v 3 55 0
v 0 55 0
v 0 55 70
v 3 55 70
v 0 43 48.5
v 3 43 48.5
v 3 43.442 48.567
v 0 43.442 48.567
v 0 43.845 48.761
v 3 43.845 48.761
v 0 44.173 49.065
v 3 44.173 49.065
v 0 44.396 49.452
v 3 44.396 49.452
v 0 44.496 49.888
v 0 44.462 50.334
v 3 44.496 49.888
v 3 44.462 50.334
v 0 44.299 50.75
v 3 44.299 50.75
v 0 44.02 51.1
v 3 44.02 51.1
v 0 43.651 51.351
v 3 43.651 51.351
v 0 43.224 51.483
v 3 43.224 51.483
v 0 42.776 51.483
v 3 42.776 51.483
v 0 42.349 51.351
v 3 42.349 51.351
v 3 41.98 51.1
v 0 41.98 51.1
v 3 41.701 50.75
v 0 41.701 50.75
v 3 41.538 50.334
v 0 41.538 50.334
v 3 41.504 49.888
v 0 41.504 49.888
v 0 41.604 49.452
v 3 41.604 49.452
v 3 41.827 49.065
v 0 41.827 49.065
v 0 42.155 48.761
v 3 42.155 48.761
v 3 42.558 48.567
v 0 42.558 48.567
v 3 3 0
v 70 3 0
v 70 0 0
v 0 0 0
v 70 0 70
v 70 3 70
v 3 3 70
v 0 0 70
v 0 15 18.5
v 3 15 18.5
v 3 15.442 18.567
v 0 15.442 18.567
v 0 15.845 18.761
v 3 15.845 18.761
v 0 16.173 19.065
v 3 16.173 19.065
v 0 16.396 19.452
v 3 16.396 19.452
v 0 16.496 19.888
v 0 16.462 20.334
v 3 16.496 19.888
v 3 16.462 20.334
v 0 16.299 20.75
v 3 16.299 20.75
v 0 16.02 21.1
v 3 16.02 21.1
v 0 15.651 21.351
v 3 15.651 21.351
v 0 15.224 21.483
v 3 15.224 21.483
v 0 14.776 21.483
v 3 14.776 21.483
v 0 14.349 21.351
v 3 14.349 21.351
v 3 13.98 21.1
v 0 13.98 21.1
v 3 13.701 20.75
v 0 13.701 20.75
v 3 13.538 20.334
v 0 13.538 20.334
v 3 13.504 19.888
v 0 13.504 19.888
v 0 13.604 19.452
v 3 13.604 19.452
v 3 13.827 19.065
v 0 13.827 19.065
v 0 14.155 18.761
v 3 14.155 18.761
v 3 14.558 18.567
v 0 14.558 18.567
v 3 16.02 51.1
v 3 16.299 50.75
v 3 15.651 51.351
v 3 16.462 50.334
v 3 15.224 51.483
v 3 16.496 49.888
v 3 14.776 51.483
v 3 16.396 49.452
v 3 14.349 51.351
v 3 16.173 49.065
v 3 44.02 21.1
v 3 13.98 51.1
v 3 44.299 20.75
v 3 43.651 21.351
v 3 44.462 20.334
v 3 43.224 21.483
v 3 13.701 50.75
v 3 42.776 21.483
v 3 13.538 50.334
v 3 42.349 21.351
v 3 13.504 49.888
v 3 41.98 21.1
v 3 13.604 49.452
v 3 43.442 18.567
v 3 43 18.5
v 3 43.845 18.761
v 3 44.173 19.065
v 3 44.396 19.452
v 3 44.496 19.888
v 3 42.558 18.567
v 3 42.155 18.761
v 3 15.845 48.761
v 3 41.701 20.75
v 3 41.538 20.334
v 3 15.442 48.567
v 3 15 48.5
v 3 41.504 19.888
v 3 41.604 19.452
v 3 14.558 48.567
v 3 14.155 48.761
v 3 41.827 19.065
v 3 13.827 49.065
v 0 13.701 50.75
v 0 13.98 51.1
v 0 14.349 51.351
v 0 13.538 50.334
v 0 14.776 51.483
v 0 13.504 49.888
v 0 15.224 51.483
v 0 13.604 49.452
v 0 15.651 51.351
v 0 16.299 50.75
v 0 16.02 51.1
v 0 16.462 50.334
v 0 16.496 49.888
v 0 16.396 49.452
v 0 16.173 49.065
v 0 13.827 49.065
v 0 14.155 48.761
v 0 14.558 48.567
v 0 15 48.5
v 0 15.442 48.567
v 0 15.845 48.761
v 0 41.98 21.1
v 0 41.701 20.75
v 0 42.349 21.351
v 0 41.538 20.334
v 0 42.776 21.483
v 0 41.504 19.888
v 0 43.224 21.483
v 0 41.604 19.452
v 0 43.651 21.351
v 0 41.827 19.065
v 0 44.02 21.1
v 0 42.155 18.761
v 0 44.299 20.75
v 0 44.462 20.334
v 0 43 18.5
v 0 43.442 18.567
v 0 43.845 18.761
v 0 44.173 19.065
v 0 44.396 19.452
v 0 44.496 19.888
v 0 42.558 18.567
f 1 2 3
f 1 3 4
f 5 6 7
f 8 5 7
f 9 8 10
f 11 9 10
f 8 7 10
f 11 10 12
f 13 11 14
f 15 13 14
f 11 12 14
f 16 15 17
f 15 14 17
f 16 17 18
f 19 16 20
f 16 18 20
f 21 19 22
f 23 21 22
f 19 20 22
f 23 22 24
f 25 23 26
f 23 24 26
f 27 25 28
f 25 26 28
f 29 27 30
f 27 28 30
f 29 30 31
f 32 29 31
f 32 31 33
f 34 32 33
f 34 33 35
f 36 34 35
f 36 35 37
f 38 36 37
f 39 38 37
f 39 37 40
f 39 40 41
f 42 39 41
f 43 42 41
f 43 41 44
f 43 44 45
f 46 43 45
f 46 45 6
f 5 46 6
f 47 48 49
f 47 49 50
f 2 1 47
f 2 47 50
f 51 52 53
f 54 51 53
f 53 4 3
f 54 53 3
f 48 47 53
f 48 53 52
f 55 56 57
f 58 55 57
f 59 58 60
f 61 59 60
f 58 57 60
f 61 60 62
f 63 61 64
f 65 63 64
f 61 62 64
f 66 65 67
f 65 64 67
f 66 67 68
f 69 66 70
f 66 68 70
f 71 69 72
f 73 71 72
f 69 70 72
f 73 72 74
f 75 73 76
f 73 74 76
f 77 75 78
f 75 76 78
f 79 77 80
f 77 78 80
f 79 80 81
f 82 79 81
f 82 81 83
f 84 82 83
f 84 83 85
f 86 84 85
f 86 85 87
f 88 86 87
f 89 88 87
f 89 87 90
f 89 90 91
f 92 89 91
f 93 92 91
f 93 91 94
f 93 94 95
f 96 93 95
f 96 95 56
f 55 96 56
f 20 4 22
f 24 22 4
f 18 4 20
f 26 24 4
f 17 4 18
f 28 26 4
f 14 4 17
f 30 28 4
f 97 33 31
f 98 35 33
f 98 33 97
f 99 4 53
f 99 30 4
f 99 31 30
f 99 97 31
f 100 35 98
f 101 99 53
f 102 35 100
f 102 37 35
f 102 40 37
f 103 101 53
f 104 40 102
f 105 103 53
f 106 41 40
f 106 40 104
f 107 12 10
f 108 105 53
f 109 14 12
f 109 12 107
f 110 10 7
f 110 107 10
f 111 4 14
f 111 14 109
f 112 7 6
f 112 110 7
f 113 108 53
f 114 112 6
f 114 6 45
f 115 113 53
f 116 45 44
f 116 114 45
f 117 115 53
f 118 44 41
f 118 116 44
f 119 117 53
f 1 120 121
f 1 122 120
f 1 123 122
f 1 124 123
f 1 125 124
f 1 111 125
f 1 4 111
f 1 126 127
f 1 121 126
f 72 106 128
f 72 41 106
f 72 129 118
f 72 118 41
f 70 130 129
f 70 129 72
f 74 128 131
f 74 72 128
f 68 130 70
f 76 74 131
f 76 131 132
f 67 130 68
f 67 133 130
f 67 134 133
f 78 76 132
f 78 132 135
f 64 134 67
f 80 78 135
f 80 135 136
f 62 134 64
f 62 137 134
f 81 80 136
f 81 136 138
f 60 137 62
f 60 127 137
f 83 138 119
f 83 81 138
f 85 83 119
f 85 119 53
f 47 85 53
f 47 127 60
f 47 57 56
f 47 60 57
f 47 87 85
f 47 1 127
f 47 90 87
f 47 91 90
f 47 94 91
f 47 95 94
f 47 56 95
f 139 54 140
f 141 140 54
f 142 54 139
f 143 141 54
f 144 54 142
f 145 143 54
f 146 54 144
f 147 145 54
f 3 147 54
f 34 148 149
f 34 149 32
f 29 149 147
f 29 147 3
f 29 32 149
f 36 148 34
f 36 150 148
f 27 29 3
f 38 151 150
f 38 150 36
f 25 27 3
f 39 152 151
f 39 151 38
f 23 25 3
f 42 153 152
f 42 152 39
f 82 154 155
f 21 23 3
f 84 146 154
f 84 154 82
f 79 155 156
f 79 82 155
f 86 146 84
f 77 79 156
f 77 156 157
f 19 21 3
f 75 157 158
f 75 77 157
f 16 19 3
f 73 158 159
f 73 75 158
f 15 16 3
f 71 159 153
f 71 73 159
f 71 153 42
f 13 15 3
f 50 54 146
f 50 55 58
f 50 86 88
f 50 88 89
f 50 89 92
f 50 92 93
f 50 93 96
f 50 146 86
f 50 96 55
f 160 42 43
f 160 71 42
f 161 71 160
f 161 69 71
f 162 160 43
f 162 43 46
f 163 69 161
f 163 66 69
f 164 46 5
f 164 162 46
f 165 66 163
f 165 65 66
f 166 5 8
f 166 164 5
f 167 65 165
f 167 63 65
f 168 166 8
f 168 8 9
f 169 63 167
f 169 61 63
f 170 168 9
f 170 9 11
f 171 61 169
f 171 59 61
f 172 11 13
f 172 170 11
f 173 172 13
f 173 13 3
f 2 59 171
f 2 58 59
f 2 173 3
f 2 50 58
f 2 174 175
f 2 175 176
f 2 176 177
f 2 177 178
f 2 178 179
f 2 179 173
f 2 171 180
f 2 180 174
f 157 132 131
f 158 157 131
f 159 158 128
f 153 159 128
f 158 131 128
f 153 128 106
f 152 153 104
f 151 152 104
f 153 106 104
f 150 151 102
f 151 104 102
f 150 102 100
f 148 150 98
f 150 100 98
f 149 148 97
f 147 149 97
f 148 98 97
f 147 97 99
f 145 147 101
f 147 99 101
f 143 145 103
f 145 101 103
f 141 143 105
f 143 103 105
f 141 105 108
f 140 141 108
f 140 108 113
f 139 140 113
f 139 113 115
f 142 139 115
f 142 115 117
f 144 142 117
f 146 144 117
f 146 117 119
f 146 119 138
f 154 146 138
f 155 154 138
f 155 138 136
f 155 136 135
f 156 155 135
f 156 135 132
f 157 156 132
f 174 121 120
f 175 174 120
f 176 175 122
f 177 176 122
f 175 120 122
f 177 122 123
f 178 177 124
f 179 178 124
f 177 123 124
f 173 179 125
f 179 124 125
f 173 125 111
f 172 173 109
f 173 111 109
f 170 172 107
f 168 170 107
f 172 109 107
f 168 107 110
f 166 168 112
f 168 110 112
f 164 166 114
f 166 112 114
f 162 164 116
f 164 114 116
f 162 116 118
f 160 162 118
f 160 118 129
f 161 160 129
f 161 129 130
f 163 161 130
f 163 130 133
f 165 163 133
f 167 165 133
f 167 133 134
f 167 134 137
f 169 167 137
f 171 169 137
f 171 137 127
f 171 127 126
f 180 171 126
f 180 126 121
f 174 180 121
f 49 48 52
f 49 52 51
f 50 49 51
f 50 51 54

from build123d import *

# Parameters (mm, degrees)
BOSS_EXTRUDE1_DEPTH = 70
SKETCH2_R           = 1.5
CUT_EXTRUDE1_DEPTH  = 70


with BuildPart() as part:
    # Sketch1 → Boss-Extrude1 (new body)
    with BuildSketch(Plane.XY):
        Polygon((0, 0), (0, 55), (3, 55), (3, 3), (70, 3), (70, 0), align=None)
    extrude(amount=BOSS_EXTRUDE1_DEPTH)

    # Sketch2 → Cut-Extrude1 (cut)
    with BuildSketch(Plane(origin=(3, 0, 0), x_dir=(0, 0, -1), z_dir=(1, 0, 0))):
        with Locations((-50, 43)):
            Circle(SKETCH2_R)
        with Locations((-20, 43)):
            Circle(SKETCH2_R)
        with Locations((-20, 15)):
            Circle(SKETCH2_R)
        with Locations((-50, 15)):
            Circle(SKETCH2_R)
    extrude(amount=-CUT_EXTRUDE1_DEPTH, mode=Mode.SUBTRACT)


solid = part.part
